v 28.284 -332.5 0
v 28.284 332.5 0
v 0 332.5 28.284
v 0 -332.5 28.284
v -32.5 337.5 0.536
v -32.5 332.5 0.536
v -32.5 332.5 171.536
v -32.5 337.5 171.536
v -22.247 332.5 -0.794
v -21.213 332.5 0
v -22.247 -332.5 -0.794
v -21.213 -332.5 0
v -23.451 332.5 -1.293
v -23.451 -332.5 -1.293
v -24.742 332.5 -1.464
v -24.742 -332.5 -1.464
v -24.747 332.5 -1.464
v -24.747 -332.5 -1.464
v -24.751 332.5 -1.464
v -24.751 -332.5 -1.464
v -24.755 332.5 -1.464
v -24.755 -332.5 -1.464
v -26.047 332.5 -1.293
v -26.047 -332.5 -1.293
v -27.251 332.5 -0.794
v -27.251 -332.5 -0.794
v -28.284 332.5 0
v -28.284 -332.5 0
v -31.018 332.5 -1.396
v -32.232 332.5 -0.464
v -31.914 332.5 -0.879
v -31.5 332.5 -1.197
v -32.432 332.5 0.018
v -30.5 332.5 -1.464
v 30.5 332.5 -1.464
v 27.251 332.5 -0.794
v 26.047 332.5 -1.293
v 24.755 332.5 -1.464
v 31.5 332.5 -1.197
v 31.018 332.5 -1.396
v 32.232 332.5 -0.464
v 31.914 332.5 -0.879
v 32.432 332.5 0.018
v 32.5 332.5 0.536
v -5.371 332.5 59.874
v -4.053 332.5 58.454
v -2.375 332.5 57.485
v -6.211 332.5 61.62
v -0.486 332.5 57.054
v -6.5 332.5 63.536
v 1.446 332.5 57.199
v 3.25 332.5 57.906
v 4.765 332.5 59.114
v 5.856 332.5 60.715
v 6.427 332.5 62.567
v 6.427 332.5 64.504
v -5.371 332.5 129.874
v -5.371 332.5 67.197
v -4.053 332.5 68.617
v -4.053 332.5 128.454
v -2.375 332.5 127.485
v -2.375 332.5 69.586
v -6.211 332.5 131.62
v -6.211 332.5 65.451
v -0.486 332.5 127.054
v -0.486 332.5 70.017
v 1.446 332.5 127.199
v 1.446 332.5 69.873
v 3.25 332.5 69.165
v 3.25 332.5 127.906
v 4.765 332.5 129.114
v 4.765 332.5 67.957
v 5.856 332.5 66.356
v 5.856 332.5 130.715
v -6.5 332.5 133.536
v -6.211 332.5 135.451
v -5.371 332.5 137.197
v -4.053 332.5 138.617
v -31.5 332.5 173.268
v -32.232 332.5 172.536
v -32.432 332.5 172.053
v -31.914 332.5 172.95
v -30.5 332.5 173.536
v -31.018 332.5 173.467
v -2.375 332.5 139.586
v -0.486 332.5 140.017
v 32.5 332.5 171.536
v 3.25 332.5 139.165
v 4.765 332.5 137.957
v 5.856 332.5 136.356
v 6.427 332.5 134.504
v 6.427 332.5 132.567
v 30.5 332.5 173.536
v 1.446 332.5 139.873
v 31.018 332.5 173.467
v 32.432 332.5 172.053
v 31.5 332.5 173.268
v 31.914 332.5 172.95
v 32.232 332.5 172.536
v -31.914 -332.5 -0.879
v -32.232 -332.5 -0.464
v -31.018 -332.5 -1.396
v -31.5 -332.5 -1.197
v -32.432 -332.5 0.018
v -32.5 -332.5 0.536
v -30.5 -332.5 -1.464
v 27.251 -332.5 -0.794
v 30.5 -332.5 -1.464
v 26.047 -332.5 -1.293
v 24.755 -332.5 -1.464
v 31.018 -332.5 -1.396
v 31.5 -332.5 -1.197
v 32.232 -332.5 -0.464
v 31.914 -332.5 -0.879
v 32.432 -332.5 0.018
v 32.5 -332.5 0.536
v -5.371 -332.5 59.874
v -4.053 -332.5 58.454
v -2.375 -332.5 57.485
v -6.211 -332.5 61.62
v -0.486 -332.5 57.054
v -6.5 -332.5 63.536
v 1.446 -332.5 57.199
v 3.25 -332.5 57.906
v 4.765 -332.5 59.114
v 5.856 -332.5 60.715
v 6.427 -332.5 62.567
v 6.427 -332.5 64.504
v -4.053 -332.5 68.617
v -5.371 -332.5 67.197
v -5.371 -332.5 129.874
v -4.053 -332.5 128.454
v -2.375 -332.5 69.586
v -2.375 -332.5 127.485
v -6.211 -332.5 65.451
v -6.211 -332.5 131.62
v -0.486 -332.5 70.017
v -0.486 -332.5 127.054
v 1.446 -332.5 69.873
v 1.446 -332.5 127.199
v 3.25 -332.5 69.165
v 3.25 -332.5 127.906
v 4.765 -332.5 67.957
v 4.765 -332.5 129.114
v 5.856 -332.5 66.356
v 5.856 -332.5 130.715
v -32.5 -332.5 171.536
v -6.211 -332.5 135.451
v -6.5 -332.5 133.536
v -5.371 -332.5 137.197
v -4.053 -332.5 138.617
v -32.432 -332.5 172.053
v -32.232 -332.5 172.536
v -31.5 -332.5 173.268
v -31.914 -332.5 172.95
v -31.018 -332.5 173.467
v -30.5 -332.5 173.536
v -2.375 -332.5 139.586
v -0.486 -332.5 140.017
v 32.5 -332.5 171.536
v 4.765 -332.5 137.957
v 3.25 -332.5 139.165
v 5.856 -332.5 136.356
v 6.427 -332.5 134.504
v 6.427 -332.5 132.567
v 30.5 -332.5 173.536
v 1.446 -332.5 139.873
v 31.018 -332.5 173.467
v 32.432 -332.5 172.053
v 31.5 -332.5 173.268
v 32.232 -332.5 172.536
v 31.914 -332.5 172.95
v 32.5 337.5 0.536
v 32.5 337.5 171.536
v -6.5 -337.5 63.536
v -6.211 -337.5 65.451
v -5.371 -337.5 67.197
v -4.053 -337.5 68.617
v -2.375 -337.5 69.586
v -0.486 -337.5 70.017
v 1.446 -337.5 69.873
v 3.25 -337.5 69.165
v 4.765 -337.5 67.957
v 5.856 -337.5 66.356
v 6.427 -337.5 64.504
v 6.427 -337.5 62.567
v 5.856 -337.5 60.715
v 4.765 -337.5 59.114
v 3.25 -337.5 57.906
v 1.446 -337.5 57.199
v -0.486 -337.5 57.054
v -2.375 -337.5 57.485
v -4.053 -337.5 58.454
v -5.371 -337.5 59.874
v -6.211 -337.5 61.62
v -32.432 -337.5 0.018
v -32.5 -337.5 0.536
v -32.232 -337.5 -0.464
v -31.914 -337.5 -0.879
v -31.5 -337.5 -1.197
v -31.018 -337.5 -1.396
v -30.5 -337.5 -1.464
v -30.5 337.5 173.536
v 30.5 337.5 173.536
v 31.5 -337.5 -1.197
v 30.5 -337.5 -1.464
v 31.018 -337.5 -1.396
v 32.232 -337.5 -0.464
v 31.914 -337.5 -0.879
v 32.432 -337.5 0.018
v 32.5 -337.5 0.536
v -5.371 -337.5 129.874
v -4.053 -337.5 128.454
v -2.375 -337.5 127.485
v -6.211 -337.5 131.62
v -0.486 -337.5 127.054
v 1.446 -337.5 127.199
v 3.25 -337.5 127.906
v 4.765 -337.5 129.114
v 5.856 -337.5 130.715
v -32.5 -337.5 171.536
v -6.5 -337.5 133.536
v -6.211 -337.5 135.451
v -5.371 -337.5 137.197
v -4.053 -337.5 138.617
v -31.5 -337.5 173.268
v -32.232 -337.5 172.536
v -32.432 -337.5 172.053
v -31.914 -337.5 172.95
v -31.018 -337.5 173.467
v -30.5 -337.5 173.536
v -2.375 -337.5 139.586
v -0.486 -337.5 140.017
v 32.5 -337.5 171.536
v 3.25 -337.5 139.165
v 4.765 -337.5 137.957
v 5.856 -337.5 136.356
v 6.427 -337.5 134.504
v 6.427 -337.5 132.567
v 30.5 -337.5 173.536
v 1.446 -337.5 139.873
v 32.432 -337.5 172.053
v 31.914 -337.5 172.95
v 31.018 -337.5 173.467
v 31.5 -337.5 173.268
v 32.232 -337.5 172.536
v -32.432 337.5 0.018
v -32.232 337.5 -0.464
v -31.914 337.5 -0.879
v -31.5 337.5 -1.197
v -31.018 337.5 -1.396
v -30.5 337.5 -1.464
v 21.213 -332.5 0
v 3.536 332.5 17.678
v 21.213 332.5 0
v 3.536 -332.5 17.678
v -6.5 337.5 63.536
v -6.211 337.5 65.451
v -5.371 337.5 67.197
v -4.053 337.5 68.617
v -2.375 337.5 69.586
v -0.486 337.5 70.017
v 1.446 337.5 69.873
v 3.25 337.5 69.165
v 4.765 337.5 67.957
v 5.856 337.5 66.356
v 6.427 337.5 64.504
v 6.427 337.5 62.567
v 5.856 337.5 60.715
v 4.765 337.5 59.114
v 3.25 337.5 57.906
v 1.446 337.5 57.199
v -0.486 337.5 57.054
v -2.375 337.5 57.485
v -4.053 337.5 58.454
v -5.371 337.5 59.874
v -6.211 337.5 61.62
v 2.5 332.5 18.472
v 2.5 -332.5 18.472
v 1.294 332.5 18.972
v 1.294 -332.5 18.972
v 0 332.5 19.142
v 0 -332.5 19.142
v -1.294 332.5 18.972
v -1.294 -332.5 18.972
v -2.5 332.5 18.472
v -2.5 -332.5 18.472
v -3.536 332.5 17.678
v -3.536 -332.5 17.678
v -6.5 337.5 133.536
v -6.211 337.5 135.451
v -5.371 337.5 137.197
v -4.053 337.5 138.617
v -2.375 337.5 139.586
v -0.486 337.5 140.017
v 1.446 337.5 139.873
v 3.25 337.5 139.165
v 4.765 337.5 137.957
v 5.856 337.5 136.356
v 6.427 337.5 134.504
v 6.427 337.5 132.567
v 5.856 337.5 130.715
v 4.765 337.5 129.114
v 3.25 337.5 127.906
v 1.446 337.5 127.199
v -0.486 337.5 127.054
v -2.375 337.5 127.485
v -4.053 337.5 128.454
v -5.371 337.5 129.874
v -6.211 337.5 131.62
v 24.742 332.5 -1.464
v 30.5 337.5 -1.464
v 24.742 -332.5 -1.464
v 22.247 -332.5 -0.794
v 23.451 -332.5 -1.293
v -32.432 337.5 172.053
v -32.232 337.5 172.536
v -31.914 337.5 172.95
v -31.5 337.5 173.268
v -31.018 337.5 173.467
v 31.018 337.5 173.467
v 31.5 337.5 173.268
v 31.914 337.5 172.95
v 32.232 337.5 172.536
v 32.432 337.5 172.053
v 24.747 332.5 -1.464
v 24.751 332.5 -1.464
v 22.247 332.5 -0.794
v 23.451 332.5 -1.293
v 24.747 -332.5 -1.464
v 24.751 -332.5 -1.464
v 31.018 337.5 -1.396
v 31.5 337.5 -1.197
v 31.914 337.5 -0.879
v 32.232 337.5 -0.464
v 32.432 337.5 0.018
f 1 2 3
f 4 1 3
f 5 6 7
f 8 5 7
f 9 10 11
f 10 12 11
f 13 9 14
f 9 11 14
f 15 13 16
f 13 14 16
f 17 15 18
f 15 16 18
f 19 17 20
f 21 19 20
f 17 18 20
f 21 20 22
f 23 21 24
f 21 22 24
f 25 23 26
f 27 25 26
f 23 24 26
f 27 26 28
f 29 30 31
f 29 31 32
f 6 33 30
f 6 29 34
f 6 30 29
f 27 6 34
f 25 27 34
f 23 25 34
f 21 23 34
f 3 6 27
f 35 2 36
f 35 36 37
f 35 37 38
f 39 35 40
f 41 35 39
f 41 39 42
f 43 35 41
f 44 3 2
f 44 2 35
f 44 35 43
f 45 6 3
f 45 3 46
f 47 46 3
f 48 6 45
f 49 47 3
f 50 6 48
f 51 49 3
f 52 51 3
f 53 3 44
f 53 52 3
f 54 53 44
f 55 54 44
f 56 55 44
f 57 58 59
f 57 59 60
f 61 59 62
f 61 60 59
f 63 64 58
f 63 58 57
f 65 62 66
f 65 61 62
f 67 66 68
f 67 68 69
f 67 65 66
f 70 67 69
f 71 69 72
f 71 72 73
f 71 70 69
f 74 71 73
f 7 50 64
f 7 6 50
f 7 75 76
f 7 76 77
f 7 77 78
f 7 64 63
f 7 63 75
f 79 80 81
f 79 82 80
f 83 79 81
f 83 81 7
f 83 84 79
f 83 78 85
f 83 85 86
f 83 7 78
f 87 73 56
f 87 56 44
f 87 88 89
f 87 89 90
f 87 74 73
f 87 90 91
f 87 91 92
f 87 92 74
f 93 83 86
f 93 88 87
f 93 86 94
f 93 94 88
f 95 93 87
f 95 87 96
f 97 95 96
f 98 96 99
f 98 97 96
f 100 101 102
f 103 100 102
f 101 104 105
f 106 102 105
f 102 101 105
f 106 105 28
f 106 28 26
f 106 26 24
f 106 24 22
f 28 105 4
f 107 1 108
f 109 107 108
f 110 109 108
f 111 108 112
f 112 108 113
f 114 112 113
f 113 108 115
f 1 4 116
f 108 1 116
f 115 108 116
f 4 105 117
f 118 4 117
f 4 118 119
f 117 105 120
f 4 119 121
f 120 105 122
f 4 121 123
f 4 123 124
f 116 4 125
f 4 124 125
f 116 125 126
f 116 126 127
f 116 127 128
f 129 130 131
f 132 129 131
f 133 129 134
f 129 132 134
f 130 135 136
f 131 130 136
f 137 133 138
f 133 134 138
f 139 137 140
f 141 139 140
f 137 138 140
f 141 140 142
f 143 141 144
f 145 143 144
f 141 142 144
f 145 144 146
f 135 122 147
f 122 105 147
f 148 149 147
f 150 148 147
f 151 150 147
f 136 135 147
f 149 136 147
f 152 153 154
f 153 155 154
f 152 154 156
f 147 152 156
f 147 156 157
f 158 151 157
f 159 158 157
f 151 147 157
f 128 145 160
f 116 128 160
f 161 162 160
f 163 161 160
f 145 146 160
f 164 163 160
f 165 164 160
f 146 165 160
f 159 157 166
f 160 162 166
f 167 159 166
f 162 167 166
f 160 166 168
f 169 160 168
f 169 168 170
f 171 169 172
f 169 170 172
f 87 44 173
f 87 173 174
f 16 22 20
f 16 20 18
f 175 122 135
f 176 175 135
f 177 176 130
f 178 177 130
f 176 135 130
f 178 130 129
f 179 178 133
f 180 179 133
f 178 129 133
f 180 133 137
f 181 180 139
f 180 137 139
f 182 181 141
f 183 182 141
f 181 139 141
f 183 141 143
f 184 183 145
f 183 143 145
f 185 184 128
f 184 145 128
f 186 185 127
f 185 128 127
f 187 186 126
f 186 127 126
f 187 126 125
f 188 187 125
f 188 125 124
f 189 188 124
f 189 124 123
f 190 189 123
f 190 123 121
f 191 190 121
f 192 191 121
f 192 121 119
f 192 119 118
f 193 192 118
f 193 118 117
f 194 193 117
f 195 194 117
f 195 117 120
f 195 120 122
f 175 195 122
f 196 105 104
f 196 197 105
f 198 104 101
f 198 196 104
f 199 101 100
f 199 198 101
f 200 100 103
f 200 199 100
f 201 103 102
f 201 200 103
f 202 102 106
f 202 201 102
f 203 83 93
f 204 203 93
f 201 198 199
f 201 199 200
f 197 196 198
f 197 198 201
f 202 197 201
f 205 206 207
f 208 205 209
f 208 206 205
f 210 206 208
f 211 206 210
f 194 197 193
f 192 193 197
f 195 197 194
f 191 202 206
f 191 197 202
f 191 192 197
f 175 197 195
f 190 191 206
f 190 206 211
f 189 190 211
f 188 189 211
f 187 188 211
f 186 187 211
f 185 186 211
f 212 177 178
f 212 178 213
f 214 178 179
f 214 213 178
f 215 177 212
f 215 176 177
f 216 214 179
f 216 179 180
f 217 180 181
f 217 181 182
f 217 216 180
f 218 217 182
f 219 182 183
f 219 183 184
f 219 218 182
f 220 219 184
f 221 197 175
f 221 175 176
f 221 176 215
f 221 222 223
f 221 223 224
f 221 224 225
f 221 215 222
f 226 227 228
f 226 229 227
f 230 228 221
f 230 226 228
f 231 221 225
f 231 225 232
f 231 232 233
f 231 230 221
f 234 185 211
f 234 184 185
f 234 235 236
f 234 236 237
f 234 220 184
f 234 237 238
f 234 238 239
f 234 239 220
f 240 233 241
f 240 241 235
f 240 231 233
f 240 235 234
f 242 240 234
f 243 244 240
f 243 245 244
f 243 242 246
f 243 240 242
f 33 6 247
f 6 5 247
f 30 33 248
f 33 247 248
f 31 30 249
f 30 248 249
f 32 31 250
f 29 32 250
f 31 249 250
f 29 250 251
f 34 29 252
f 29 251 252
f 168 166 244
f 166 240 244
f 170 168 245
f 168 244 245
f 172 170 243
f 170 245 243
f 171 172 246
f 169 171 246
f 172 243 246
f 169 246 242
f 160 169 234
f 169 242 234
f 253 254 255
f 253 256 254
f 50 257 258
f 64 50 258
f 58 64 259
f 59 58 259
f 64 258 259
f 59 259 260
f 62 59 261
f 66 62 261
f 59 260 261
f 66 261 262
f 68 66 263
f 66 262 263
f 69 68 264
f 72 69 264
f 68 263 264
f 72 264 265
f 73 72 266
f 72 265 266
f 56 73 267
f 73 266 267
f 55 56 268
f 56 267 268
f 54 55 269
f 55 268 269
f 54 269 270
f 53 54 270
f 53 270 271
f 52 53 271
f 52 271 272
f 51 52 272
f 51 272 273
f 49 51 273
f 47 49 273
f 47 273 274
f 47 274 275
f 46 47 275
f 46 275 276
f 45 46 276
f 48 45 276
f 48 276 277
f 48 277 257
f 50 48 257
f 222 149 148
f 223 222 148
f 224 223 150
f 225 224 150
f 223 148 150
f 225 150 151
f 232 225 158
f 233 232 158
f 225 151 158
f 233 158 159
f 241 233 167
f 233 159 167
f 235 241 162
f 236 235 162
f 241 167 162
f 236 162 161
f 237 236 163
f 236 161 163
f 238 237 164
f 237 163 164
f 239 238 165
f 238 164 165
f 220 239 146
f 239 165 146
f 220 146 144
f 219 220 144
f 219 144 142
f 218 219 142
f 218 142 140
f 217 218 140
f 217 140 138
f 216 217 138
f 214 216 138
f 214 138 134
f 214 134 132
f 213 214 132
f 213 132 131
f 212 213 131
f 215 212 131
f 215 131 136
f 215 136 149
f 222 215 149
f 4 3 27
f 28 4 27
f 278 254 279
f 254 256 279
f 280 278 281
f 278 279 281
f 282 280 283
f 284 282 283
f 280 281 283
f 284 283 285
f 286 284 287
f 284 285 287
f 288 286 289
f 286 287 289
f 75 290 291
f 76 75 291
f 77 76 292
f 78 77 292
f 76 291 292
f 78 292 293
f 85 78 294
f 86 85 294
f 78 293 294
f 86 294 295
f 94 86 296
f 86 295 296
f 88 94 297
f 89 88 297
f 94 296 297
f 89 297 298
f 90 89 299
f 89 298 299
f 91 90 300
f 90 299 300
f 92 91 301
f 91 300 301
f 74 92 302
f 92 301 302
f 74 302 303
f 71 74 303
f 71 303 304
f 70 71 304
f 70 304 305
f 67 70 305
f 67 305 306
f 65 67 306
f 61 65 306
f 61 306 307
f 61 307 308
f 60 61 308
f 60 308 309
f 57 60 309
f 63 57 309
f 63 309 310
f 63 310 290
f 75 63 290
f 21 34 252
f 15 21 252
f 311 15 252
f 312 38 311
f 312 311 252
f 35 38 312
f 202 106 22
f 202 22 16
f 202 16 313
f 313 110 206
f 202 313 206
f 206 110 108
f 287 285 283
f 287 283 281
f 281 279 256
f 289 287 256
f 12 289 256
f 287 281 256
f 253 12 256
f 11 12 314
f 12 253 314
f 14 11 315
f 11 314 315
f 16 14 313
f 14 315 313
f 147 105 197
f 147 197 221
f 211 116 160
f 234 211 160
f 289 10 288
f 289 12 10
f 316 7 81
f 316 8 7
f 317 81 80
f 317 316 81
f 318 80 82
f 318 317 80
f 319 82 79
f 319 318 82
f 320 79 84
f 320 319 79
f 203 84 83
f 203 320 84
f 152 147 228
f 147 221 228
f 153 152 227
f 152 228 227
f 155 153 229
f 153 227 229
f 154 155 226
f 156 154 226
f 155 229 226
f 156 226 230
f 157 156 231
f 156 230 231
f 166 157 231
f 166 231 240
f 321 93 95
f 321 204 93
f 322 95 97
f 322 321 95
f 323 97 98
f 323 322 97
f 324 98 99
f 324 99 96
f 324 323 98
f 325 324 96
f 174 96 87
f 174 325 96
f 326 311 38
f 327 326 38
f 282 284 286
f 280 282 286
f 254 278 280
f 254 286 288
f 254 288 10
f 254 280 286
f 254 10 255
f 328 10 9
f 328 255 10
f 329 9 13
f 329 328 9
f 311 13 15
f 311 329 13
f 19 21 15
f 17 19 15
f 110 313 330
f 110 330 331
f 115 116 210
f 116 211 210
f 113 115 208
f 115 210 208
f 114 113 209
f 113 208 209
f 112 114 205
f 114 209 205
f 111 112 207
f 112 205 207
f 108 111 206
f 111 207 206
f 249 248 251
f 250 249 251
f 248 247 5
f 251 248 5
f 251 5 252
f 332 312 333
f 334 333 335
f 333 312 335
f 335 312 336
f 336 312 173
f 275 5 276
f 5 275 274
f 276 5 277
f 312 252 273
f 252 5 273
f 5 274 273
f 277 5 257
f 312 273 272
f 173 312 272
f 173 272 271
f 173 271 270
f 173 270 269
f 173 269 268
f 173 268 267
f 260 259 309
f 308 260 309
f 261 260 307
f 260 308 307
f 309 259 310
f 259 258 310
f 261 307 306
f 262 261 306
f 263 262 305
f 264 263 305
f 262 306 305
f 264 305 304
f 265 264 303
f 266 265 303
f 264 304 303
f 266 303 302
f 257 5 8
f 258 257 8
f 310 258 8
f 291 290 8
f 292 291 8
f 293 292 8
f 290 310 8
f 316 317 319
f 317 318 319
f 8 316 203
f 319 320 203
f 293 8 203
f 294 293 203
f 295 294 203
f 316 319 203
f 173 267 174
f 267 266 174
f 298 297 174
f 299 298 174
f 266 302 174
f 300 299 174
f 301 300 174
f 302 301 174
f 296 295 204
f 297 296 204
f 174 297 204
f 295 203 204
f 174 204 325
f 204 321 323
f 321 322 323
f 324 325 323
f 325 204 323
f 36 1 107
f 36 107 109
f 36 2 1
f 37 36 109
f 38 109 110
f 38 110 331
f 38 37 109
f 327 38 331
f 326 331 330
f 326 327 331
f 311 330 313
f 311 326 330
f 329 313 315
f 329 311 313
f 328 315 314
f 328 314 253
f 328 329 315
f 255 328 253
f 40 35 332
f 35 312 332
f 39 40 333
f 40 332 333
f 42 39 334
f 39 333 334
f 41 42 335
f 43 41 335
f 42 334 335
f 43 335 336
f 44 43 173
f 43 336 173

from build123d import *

# Parameters (mm, degrees)
F1_DEPTH      = 332.5
F1_DEPTH_BACK = 332.5
F2_R          = 4.99999
F3_W          = 65
F3_H          = 175
F4_DEPTH      = 5
F5_R          = 2
F7_D          = 13


# Not quite as in the source:
# - a fillet or chamfer is up to 0.001 mm smaller than in the source, because OpenCascade refuses the exact size
# - a pattern or mirror of a feature is missing from the dataset's text; its kind, count and spacing are read off the source's solid
# - a feature names something its author has since deleted; it is built from what else it names


with BuildPart() as f1:
    # F0 (on Front) → F1 (new body, two sides)
    with BuildSketch(Plane.XZ) as f1_sk:
        Polygon((0, 28.2842712475), (-28.2842712475, 0), (-24.7487373415, -3.5355339059), (0, 21.2132034356), (24.7487373415, -3.5355339059), (28.2842712475, 0), align=None)
    extrude(amount=F1_DEPTH)
    extrude(f1_sk.sketch, amount=-F1_DEPTH_BACK)

    # F2 (radius 5 in the source; OpenCascade refuses exactly that, so slightly less here)
    f2_edges = [f1.edges().sort_by_distance(p)[0] for p in [
        (24.748737, 0, -3.535534),
        (0, 0, 21.213203),
        (-24.748737, 0, -3.535534),
    ]]
    fillet(f2_edges, radius=F2_R)

    # F3 (on face) → F4 (join)
    with BuildSketch(Plane.XZ.offset(332.5)):
        with Locations((0, 86.0355339059)):
            Rectangle(F3_W, F3_H)
    f4 = extrude(amount=F4_DEPTH)

    # F4_copies: F4 across plane
    add(f4.mirror(Plane.ZX))

    # F5
    f5_edges = [f1.edges().sort_by_distance(p)[0] for p in [
        (32.5, -335, 173.535534),
        (32.5, -335, -1.464466),
        (-32.5, -335, 173.535534),
        (-32.5, -335, -1.464466),
        (-32.5, 335, -1.464466),
        (32.5, 335, -1.464466),
        (-32.5, 335, 173.535534),
        (32.5, 335, 173.535534),
    ]]
    fillet(f5_edges, radius=F5_R)

    # F7 (through all)
    with Locations(Plane.XZ.offset(337.5)):
        with Locations((0, 63.5355339059), (0, 133.5355339059)):
            Hole(F7_D / 2)


solid = f1.part
